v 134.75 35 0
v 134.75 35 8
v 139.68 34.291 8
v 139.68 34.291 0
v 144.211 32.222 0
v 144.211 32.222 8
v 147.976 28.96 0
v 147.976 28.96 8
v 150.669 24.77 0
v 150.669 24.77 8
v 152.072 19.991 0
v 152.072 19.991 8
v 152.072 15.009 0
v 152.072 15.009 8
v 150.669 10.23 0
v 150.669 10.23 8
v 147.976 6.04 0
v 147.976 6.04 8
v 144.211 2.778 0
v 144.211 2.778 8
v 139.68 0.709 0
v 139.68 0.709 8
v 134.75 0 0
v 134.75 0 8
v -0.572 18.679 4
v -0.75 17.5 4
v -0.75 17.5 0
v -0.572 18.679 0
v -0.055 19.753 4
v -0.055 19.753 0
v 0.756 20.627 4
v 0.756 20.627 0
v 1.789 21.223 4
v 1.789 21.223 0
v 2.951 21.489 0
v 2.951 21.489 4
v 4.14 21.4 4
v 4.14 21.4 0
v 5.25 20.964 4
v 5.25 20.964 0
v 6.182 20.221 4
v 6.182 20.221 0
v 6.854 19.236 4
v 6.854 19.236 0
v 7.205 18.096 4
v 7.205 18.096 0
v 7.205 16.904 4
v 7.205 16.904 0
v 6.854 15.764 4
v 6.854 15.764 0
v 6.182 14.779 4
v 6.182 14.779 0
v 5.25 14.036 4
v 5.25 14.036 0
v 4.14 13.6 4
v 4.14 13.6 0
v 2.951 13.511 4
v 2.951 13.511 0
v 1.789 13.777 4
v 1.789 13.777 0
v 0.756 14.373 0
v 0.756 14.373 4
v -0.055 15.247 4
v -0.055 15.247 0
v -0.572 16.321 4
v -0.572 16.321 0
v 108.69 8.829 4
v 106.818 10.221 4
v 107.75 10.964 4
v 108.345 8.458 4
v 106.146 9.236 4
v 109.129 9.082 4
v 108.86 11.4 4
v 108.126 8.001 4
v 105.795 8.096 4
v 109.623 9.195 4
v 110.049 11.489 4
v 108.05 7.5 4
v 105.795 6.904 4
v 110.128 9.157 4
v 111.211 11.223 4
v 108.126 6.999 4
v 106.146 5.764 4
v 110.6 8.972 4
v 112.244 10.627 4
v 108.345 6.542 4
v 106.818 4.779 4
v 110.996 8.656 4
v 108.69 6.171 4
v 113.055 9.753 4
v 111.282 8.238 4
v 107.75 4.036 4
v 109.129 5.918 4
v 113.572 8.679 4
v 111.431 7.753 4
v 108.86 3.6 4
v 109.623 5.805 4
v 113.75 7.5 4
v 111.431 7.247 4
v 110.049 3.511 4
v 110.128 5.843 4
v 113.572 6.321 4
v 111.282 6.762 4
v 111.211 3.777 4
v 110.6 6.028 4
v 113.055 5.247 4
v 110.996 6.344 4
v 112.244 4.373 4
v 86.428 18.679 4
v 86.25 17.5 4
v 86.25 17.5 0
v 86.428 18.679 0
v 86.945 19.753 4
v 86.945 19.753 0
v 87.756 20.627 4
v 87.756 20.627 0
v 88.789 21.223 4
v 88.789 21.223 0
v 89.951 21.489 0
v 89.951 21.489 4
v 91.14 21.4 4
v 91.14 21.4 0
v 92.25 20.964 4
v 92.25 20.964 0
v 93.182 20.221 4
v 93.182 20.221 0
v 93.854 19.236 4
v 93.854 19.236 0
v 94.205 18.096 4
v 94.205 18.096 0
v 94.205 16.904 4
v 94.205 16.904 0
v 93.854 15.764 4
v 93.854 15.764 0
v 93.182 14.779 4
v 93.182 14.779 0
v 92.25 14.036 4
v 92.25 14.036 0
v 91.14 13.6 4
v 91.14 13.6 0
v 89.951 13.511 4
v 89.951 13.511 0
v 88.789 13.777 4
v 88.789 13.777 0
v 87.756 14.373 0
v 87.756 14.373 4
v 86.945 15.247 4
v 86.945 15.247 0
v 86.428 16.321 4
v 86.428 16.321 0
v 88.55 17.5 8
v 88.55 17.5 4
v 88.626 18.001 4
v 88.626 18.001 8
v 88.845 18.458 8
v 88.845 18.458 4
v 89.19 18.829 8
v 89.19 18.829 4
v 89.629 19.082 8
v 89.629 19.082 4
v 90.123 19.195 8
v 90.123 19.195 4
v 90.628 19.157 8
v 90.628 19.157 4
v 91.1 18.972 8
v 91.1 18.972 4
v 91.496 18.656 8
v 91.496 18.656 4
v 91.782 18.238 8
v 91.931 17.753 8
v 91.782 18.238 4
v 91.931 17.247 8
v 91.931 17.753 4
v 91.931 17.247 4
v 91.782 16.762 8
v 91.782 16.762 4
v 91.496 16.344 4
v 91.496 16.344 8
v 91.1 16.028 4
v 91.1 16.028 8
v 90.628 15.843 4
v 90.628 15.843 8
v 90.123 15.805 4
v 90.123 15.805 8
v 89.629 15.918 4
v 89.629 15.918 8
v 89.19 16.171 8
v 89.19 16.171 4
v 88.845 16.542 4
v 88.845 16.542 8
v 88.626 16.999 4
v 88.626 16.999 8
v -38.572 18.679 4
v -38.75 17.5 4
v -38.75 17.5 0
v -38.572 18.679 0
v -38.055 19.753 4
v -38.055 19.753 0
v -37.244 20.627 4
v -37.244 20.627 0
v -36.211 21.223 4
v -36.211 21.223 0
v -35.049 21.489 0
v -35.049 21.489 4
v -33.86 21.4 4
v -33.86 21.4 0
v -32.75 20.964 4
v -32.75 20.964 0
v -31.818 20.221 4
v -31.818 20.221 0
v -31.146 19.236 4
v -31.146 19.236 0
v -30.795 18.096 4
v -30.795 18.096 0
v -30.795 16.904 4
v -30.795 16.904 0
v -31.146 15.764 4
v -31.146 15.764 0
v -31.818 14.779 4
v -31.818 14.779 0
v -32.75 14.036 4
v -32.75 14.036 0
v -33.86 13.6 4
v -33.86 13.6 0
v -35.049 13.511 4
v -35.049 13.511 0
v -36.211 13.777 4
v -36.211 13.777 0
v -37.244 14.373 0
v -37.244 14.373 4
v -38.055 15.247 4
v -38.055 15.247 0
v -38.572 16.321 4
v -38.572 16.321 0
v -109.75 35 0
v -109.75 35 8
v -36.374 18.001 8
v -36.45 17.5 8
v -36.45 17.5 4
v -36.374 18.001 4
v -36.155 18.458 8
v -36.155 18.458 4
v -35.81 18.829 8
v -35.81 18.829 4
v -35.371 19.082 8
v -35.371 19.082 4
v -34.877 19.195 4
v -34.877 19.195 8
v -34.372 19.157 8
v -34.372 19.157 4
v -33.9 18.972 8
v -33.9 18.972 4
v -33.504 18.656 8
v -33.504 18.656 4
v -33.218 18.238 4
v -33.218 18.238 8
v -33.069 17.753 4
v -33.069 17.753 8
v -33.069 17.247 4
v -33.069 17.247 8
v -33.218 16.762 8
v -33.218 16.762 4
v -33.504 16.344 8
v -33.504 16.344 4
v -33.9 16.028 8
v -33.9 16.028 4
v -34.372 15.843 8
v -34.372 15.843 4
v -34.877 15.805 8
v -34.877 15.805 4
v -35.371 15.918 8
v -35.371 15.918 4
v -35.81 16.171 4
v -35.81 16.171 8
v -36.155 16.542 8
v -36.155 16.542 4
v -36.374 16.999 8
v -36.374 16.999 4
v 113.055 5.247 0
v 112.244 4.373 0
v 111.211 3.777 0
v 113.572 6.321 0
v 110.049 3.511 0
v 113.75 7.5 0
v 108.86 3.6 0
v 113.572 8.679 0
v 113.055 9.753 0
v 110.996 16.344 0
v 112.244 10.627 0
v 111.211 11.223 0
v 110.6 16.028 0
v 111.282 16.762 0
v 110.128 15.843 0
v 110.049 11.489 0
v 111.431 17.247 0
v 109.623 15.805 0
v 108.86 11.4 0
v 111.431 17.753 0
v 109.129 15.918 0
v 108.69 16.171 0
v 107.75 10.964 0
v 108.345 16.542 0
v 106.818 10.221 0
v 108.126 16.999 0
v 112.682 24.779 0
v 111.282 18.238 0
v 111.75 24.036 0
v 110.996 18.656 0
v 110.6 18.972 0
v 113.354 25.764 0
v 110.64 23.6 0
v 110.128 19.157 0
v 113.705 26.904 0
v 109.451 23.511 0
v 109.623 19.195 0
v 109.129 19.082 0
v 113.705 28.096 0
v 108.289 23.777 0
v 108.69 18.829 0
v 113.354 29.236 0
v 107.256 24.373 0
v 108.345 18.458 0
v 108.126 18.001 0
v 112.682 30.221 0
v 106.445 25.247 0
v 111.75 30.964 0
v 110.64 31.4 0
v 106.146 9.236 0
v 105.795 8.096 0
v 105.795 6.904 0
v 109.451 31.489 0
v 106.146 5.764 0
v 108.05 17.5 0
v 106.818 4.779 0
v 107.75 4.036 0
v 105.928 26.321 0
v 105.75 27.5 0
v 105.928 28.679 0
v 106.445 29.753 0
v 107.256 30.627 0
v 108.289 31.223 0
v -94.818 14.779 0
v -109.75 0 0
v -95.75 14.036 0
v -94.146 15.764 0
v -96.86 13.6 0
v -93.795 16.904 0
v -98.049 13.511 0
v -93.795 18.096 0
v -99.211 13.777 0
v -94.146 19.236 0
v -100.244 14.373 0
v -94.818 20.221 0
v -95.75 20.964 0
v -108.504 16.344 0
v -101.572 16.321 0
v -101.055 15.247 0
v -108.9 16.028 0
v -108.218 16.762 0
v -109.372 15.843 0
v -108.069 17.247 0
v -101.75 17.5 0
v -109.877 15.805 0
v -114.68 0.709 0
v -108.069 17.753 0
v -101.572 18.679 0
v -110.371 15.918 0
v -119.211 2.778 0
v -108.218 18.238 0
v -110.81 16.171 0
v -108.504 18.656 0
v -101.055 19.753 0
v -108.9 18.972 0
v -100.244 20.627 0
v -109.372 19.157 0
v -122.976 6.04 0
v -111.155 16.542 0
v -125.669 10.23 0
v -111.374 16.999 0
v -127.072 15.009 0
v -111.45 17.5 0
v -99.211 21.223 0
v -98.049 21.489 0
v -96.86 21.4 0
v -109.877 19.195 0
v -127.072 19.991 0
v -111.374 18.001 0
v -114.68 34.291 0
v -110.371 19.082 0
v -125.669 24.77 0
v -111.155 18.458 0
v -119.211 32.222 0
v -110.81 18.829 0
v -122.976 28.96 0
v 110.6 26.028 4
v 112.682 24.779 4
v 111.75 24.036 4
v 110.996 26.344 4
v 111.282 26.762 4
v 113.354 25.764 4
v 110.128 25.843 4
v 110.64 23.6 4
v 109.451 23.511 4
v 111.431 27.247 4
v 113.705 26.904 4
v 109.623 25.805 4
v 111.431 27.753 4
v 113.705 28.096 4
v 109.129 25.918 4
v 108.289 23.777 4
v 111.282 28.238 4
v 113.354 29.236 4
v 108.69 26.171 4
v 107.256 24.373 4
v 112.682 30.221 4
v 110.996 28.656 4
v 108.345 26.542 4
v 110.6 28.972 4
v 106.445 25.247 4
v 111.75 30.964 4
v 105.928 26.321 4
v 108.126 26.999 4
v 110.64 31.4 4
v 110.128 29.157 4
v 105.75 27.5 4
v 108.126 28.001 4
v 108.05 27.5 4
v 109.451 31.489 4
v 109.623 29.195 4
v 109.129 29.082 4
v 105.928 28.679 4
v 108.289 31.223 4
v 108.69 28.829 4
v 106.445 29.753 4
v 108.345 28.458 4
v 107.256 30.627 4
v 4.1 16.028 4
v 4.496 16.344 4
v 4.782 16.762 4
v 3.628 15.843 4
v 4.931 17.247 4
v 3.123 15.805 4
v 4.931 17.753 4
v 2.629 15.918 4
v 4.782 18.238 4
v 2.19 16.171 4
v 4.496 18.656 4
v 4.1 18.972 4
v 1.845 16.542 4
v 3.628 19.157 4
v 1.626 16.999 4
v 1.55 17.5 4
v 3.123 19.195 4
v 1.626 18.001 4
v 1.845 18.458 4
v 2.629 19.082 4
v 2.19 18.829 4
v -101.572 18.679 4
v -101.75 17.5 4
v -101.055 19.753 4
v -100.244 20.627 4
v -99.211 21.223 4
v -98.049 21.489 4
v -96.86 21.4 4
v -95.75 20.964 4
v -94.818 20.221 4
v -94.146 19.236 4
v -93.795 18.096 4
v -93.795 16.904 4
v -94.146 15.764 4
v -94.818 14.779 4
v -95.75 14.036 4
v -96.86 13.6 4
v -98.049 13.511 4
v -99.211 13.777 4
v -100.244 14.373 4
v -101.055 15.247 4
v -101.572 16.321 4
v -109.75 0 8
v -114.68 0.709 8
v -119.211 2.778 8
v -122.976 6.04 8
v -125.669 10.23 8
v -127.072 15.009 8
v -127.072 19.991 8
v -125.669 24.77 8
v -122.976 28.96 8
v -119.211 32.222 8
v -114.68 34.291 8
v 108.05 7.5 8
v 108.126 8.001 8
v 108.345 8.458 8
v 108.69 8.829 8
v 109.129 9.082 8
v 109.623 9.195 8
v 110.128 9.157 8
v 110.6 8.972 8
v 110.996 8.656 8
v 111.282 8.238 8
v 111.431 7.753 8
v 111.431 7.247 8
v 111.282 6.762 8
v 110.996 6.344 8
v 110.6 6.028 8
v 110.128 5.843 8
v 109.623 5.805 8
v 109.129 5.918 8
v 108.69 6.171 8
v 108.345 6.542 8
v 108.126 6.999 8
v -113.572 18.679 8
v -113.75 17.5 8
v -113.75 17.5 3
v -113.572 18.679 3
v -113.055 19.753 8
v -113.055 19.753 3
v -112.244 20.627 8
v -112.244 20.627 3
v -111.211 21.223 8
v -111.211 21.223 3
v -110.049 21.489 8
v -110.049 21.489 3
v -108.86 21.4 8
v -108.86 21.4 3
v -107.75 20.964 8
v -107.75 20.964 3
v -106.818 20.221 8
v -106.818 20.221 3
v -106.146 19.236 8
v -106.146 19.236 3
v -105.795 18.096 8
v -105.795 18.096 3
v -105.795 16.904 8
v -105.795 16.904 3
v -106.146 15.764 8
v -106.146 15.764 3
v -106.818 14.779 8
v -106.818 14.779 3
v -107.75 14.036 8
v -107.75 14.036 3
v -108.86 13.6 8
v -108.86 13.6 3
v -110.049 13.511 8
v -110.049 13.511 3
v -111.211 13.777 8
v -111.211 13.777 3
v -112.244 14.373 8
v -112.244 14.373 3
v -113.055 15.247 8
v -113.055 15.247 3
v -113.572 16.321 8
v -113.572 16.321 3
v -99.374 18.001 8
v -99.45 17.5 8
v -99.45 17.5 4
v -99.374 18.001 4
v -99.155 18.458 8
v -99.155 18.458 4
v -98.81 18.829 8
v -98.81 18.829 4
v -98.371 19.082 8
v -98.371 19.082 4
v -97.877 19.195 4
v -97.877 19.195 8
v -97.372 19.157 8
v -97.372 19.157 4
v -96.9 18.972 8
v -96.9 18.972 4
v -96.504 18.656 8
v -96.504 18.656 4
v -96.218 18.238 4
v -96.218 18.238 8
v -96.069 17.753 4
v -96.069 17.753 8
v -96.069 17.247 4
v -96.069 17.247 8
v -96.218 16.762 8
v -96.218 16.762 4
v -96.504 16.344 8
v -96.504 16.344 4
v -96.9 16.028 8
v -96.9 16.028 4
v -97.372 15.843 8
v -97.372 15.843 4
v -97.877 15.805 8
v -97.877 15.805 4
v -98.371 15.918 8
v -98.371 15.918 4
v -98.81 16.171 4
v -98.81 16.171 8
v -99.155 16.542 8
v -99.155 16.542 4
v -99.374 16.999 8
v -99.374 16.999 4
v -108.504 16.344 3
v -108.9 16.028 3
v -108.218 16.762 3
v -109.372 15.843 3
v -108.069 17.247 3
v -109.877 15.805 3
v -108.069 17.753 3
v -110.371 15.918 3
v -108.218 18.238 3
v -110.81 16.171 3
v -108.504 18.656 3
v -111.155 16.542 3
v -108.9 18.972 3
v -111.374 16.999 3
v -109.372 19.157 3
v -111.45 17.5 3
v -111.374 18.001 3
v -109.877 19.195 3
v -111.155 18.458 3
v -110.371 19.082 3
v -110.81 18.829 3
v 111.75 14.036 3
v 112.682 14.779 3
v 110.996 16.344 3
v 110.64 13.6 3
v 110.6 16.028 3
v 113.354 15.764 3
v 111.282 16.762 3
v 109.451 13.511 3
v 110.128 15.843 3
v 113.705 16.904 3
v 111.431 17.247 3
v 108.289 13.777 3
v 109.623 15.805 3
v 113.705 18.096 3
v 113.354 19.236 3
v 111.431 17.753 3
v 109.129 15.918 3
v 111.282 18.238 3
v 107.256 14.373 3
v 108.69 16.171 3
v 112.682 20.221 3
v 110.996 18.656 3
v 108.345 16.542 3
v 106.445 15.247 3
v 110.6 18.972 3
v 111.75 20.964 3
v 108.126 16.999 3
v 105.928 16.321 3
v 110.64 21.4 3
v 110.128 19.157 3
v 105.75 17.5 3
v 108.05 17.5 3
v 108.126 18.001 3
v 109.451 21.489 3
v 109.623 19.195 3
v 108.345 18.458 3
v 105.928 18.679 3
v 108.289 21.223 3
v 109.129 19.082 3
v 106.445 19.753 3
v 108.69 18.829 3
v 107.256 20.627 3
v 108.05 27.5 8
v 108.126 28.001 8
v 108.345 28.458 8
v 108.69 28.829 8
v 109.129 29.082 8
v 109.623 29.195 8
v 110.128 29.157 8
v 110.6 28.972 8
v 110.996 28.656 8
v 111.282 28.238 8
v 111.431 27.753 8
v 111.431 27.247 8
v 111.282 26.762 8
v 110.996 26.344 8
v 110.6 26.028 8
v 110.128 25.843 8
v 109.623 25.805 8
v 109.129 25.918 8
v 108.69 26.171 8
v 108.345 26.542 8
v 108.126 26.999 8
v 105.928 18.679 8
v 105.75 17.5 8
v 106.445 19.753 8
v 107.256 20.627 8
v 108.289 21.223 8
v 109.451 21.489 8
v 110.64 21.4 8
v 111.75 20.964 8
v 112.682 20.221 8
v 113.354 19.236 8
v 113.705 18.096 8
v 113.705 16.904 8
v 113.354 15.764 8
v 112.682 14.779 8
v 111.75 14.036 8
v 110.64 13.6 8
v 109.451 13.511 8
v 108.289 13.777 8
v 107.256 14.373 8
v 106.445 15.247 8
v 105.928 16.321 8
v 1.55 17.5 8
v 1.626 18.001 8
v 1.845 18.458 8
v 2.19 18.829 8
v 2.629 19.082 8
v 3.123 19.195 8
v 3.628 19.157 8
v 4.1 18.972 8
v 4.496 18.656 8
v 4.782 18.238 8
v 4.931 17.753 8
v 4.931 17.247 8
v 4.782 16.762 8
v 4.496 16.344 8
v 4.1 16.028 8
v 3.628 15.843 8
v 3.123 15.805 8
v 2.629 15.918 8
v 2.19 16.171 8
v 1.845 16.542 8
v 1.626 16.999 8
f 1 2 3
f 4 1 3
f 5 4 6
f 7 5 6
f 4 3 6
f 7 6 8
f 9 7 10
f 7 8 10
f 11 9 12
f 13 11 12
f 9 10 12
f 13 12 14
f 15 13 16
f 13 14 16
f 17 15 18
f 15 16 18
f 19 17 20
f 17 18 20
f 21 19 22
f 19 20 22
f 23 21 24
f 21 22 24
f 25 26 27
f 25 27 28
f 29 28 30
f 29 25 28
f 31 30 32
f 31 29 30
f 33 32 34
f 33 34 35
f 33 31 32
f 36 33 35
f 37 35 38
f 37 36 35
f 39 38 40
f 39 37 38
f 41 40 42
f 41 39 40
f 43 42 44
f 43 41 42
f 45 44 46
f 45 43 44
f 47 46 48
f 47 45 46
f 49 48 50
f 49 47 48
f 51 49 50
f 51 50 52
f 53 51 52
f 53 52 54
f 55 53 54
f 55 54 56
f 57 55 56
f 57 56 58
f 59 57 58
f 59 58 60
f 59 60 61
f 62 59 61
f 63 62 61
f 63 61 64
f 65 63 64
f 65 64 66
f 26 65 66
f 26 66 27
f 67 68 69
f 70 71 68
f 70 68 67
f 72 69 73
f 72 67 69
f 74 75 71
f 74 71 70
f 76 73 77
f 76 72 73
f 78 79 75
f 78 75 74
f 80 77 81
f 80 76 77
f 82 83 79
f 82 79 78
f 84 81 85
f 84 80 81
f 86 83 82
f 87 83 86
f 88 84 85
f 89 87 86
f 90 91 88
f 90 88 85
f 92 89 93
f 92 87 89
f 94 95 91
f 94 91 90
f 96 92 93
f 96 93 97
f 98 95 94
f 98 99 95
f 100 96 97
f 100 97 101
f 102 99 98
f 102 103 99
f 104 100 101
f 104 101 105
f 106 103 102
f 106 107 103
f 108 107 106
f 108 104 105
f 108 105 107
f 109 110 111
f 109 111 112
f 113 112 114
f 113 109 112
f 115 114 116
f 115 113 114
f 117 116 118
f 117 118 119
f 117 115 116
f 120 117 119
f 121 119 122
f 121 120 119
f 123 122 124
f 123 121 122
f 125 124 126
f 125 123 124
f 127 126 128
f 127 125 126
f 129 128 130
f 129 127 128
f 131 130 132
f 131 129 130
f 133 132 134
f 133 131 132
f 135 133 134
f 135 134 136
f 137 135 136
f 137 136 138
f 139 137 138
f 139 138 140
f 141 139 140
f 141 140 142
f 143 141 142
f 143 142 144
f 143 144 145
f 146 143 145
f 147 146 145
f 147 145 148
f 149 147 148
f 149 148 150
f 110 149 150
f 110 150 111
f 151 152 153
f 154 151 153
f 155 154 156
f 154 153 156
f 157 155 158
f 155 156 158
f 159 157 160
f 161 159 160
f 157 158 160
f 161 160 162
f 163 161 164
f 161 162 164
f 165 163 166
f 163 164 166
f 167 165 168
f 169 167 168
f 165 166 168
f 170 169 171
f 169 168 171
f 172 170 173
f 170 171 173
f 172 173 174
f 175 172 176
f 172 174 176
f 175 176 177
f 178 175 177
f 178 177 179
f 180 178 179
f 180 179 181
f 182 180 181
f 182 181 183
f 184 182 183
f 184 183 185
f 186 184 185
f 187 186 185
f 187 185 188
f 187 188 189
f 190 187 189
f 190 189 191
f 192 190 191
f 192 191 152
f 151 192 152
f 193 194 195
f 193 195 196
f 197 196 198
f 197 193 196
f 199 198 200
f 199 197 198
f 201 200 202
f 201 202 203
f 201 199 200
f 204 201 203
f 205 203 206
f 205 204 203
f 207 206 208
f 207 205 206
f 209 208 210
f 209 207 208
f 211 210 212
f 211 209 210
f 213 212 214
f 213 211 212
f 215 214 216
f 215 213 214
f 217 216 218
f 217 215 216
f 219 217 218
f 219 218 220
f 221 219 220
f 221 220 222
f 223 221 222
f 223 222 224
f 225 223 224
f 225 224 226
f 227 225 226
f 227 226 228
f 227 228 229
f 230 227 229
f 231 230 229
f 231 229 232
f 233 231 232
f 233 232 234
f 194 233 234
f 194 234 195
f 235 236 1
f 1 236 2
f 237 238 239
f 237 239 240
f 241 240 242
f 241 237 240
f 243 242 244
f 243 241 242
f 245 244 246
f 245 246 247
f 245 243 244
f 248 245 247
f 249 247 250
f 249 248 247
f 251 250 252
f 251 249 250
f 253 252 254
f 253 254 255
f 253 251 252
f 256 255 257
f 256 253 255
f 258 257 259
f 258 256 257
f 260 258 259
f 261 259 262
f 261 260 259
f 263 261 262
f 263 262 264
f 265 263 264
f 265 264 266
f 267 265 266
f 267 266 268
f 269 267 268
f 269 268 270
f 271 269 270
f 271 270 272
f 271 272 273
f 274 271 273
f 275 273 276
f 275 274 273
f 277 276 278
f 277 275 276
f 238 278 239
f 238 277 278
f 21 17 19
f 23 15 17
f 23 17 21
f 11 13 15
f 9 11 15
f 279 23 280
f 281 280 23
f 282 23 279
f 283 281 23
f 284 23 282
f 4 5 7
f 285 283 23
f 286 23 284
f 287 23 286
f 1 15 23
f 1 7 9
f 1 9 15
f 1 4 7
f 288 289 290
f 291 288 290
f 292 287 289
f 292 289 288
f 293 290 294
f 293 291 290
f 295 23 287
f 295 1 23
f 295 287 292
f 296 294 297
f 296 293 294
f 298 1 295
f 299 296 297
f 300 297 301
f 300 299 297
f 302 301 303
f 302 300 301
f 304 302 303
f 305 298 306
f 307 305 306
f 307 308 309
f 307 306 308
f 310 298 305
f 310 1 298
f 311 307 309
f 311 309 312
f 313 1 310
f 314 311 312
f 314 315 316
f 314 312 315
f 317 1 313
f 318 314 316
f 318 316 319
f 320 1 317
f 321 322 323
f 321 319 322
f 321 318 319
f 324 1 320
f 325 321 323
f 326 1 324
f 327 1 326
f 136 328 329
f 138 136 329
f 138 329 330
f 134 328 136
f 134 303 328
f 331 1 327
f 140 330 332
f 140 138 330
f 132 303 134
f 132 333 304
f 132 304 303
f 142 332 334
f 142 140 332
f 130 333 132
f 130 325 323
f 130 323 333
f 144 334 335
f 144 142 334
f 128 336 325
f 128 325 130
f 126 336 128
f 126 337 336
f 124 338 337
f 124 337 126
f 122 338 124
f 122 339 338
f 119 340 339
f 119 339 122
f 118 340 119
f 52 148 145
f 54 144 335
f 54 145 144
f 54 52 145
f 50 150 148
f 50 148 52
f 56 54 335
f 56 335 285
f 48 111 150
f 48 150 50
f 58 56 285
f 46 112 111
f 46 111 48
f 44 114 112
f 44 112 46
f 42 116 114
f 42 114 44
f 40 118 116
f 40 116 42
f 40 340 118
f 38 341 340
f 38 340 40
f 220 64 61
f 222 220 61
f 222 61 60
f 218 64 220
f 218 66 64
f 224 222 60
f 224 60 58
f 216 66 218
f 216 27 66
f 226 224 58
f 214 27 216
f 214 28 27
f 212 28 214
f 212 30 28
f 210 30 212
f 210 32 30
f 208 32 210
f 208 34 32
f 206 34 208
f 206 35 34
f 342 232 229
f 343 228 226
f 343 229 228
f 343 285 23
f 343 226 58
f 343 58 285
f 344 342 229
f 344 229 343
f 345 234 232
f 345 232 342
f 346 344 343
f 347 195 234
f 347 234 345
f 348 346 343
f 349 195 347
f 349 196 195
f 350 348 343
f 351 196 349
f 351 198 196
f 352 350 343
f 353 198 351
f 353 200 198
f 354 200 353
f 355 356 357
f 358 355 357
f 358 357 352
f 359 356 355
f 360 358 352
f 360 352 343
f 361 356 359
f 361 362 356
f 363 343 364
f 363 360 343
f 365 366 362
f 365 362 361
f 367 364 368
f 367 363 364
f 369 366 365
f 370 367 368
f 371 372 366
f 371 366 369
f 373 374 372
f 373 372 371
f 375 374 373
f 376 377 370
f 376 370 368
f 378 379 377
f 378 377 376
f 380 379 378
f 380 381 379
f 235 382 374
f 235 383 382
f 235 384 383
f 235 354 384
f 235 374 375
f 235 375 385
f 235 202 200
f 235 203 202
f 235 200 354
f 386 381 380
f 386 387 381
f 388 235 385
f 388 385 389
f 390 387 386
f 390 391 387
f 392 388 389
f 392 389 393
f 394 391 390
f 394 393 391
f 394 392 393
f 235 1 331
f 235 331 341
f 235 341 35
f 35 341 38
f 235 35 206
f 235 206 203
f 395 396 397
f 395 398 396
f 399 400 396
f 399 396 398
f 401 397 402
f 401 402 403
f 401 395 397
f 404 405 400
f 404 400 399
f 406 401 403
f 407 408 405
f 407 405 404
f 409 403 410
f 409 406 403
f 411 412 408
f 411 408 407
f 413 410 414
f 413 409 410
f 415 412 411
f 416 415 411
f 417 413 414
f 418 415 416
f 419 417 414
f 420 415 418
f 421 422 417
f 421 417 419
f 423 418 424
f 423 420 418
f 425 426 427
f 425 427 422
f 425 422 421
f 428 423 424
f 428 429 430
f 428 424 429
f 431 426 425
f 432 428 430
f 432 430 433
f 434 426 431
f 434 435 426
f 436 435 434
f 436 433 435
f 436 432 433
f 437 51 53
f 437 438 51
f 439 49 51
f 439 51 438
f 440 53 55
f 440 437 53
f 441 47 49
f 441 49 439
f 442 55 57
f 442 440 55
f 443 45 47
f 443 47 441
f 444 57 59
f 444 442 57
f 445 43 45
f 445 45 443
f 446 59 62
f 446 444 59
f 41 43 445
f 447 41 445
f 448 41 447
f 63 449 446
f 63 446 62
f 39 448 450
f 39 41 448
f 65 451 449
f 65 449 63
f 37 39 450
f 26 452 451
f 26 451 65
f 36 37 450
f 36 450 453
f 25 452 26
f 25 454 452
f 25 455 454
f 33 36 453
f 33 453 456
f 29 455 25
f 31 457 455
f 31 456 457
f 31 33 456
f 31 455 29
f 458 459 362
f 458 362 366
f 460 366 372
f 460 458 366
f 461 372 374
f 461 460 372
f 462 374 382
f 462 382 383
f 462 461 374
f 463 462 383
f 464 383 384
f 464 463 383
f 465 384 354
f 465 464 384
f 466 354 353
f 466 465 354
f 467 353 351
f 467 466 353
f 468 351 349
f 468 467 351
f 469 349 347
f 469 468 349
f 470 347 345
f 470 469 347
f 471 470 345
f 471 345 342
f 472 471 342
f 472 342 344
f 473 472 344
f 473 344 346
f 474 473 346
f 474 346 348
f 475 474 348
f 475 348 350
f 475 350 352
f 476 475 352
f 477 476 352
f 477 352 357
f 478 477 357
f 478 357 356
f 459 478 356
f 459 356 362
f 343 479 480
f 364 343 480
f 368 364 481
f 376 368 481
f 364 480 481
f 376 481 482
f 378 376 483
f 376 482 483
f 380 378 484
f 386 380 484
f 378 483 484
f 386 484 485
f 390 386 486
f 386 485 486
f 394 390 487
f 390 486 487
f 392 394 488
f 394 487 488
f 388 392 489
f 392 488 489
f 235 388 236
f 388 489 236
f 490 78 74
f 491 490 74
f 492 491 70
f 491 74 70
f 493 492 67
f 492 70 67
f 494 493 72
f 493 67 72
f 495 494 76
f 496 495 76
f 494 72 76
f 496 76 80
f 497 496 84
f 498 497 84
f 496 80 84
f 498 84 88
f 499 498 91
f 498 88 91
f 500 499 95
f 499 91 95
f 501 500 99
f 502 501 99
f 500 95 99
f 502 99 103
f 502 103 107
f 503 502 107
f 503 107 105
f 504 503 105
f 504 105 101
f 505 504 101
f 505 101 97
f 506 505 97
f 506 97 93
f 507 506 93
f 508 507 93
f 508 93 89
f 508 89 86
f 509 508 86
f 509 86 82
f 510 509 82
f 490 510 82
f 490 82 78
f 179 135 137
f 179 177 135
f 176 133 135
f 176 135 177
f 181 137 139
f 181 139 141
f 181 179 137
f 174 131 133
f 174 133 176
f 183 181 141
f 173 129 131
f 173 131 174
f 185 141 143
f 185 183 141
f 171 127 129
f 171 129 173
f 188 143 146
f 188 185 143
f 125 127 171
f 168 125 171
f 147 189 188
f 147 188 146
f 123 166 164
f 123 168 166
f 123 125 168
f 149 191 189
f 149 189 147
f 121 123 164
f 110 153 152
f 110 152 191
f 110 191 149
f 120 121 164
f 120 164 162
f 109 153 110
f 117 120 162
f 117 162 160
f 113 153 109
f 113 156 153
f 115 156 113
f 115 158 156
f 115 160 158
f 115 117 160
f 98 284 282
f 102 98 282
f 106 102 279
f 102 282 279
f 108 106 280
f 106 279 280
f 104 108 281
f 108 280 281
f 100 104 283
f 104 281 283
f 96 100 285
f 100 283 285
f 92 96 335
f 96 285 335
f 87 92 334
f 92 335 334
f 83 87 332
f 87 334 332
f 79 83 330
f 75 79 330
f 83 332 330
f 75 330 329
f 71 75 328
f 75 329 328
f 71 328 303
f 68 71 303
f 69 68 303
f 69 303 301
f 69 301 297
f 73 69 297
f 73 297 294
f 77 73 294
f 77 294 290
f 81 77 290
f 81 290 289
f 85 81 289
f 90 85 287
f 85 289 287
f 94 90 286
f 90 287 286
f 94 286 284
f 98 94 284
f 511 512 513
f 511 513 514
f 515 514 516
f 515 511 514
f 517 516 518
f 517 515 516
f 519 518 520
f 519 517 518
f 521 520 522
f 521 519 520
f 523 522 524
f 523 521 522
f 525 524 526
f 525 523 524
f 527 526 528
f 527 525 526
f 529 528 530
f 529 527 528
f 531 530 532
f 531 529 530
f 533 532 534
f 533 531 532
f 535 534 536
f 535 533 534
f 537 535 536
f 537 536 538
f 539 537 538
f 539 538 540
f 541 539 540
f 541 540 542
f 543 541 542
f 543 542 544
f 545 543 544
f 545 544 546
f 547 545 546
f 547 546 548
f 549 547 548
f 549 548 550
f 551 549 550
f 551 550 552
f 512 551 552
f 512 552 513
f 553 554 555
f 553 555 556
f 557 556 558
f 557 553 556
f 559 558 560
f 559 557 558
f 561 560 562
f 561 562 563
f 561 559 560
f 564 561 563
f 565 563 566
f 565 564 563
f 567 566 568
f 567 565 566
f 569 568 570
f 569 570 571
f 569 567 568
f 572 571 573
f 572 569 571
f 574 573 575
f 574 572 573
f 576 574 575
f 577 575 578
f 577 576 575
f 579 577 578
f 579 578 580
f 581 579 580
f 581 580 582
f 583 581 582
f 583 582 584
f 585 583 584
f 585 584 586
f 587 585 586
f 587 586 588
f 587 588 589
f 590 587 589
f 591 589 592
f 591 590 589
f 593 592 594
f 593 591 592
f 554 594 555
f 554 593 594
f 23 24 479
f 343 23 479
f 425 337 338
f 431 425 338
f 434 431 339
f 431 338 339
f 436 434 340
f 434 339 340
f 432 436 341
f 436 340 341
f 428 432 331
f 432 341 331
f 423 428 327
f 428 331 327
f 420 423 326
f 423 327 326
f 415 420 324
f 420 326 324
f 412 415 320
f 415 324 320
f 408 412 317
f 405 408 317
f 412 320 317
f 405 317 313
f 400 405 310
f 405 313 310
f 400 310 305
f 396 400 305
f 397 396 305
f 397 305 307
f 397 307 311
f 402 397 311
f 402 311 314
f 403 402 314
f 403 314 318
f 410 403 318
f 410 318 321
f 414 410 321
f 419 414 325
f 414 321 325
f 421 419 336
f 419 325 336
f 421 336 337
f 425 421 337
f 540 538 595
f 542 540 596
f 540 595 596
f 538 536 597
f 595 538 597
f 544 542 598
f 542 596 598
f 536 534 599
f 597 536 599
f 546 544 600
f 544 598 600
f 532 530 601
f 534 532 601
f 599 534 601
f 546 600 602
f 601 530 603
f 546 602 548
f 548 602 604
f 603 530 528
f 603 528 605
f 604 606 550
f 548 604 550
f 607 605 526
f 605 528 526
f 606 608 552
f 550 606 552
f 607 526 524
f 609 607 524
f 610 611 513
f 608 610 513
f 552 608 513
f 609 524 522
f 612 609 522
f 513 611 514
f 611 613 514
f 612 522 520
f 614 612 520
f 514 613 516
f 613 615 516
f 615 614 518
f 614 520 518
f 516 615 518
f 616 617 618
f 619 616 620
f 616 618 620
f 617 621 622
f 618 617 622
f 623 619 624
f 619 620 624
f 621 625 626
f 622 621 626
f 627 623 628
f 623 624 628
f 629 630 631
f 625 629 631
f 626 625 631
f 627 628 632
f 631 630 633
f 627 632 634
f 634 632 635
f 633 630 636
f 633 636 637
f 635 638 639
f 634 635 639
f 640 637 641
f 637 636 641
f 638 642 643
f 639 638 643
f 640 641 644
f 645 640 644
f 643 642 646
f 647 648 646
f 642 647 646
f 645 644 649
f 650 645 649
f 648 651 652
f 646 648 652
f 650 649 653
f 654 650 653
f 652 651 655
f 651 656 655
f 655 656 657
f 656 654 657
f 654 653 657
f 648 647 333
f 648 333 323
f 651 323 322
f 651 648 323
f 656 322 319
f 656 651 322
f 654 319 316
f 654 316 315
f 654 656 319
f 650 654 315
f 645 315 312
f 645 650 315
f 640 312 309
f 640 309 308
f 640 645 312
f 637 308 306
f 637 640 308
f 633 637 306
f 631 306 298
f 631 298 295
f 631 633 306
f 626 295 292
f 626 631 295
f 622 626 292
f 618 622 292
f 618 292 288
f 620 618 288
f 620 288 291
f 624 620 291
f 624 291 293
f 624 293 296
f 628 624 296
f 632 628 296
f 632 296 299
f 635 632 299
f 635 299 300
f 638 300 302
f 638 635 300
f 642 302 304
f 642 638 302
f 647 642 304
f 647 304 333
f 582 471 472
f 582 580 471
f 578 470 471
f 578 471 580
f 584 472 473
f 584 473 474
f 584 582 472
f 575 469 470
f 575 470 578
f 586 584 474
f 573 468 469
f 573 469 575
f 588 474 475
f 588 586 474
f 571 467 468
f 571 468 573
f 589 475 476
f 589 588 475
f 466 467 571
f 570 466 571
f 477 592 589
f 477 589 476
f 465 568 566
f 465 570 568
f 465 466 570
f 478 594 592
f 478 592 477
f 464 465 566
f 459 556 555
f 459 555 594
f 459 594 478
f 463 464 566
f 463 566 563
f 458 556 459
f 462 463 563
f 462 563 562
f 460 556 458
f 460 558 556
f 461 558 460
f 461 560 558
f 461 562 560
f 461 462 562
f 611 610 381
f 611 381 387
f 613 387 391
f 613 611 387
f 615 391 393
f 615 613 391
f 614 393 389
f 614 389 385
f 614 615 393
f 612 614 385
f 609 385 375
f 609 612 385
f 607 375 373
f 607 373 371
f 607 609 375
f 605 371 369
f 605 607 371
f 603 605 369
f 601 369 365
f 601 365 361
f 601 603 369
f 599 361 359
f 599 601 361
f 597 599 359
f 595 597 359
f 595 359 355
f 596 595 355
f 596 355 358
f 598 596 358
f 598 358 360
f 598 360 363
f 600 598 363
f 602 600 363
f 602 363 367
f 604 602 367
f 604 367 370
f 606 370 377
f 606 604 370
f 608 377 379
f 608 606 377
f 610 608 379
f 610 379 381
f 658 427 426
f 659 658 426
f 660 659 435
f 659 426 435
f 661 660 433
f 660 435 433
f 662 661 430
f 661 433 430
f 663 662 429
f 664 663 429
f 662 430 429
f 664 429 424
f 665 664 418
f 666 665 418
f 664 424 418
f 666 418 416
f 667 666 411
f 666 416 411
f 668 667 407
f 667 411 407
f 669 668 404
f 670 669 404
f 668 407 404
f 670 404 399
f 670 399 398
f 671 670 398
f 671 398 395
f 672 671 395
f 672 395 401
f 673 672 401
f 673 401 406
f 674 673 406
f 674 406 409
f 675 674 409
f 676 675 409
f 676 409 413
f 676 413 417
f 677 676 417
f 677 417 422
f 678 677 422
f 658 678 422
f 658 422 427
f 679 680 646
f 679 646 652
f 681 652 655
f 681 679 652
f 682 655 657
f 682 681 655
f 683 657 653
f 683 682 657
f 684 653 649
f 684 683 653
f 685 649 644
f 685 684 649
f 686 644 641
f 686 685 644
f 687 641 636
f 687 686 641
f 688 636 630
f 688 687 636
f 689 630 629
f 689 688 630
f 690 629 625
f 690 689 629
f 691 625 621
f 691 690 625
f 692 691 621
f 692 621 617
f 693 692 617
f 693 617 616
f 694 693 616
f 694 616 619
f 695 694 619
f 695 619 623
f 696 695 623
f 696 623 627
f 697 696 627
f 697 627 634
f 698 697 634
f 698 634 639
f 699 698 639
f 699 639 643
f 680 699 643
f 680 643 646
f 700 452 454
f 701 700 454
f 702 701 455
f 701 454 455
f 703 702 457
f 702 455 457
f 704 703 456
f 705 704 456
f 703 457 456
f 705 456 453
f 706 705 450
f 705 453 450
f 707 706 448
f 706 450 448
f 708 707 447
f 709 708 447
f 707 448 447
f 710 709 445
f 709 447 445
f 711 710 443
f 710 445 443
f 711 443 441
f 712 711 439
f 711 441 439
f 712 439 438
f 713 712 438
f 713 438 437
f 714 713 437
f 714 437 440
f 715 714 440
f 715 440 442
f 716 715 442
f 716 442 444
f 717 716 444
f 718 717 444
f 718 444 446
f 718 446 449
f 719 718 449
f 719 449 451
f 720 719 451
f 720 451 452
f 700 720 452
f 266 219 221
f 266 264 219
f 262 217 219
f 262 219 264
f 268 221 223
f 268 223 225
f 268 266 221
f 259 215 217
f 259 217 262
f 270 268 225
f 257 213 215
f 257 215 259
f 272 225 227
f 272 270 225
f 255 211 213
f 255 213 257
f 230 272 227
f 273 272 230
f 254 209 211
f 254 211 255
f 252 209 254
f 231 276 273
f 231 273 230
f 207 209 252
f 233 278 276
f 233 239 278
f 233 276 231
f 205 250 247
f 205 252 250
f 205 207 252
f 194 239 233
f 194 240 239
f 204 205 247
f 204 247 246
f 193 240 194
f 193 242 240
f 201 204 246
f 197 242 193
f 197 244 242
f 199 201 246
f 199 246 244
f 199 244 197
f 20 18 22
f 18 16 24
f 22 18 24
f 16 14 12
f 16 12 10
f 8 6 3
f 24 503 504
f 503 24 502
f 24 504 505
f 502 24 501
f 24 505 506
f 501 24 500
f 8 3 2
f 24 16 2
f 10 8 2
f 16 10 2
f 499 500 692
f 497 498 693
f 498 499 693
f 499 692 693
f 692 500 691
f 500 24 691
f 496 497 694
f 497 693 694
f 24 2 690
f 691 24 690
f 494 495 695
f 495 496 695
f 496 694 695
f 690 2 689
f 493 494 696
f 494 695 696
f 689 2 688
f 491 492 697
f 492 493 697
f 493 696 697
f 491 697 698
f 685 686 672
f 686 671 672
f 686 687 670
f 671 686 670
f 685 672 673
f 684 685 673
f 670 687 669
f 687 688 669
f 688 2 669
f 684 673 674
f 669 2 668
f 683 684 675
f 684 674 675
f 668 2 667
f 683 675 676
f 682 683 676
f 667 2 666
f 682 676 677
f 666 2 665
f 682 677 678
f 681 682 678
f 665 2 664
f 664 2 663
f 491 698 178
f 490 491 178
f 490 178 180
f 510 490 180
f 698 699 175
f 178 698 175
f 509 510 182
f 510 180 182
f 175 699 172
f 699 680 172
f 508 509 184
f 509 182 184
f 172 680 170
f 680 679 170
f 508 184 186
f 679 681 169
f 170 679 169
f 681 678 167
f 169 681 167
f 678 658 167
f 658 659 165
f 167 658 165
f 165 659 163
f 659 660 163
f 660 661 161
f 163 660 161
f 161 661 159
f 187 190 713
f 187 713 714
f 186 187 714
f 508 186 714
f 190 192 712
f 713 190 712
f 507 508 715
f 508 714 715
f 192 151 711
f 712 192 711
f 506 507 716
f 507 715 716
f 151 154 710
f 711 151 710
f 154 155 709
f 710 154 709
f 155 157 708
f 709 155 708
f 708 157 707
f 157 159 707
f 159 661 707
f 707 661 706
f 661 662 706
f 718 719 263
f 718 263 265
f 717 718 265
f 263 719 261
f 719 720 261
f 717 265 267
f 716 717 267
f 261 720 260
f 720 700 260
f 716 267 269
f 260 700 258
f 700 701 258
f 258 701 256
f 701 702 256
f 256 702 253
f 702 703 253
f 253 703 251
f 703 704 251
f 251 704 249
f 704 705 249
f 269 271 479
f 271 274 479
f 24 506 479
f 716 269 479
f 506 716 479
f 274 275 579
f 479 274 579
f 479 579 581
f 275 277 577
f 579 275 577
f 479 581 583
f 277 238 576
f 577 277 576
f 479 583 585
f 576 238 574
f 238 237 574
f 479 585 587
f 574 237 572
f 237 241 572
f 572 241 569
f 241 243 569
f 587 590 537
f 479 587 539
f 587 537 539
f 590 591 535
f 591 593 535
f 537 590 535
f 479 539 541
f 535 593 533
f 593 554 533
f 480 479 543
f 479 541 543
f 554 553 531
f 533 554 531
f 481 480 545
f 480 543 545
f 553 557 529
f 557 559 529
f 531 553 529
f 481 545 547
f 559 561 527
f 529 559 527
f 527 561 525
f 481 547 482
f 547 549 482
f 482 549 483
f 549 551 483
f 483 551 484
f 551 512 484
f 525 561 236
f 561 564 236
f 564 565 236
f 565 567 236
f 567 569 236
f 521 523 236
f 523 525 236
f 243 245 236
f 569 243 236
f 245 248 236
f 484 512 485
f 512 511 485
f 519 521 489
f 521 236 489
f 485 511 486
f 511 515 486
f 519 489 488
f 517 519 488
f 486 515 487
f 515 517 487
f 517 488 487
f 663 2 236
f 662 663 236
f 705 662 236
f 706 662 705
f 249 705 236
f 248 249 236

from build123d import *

# Parameters (mm, degrees)
CUT_EXTRUDE1_START         = -8.000000119
CUT_EXTRUDE1_OUTLINE_R     = 3.999999708
CUT_EXTRUDE1_OUTLINE_R_2   = 4
CUT_EXTRUDE1_OUTLINE_R_3   = 4.000000498
CUT_EXTRUDE1_OUTLINE_R_4   = 1.7
CUT_EXTRUDE1_DEPTH         = 8.000000119
CUT_EXTRUDE1_2_OUTLINE_R   = 4
CUT_EXTRUDE1_2_OUTLINE_R_2 = 1.7
CUT_EXTRUDE1_2_DEPTH       = 4.000000119
CUT_EXTRUDE1_START_2       = -3.000000119
CUT_EXTRUDE1_3_OUTLINE_R   = 4.000000498
CUT_EXTRUDE1_3_OUTLINE_R_2 = 1.699999454
CUT_EXTRUDE1_3_OUTLINE_R_3 = 3.999999708
CUT_EXTRUDE1_3_OUTLINE_R_4 = 1.700000883
CUT_EXTRUDE1_3_DEPTH       = 3.000000119
SKETCH2_R                  = 1.7
CUT_EXTRUDE2_DEPTH         = 133.217863668
BOSS_EXTRUDE1_START        = -8.000000119
BOSS_EXTRUDE1_DEPTH        = 8.000000119
SKETCH4_R                  = 4
SKETCH4_R_2                = 1.7
CUT_EXTRUDE3_DEPTH         = 4
SKETCH5_R                  = 1.7
CUT_EXTRUDE4_DEPTH         = 157.425904707


with BuildPart() as part:
    # Cut-Extrude1: read off the stored shape, not the designer's step
    # Cut-Extrude1 outline → Cut-Extrude1 (new body)
    # profile 1 of 3: a face of its own
    with BuildSketch(Plane(origin=(0, 0, 0), x_dir=(-1, 0, 0), z_dir=(0, 0, -1)).offset(CUT_EXTRUDE1_START)):
        with BuildLine():
            ThreePointArc((109.750003815, 0), (127.250003815, 17.5), (109.750003815, 35))
            Line((109.750003815, 35), (-109.750003815, 35))
            ThreePointArc((-109.750003815, 35), (-127.250003815, 17.5), (-109.750003815, 0))
            Line((-109.750003815, 0), (109.750003815, 0))
        make_face()
        with Locations((-109.750001685, 17.500000345)):
            Circle(CUT_EXTRUDE1_OUTLINE_R, mode=Mode.SUBTRACT)
        with Locations((-90.249998482, 17.5)):
            Circle(CUT_EXTRUDE1_OUTLINE_R_2, mode=Mode.SUBTRACT)
        with Locations((-3.249998482, 17.5)):
            Circle(CUT_EXTRUDE1_OUTLINE_R_2, mode=Mode.SUBTRACT)
        with Locations((34.750001518, 17.5)):
            Circle(CUT_EXTRUDE1_OUTLINE_R_2, mode=Mode.SUBTRACT)
        with Locations((97.750001518, 17.5)):
            Circle(CUT_EXTRUDE1_OUTLINE_R_2, mode=Mode.SUBTRACT)
        with Locations((109.750001518, 17.500000345)):
            Circle(CUT_EXTRUDE1_OUTLINE_R_3, mode=Mode.SUBTRACT)
    # profile 2 of 3: a face of its own
    with BuildSketch(Plane(origin=(0, 0, 0), x_dir=(-1, 0, 0), z_dir=(0, 0, -1)).offset(CUT_EXTRUDE1_START)):
        with Locations((-3.249998482, 17.5)):
            Circle(CUT_EXTRUDE1_OUTLINE_R_4)
    # profile 3 of 3: a face of its own
    with BuildSketch(Plane(origin=(0, 0, 0), x_dir=(-1, 0, 0), z_dir=(0, 0, -1)).offset(CUT_EXTRUDE1_START)):
        with Locations((-90.249998482, 17.5)):
            Circle(CUT_EXTRUDE1_OUTLINE_R_4)
    extrude(amount=CUT_EXTRUDE1_DEPTH)

    # Cut-Extrude1 2 outline → Cut-Extrude1 2 (add)
    # profile 1 of 4: a face of its own
    with BuildSketch(Plane(origin=(0, 0, 0), x_dir=(-1, 0, 0), z_dir=(0, 0, -1)).offset(CUT_EXTRUDE1_START)):
        with Locations((34.750001518, 17.5)):
            Circle(CUT_EXTRUDE1_2_OUTLINE_R)
        with Locations((34.750001518, 17.5)):
            Circle(CUT_EXTRUDE1_2_OUTLINE_R_2, mode=Mode.SUBTRACT)
    # profile 2 of 4: a face of its own
    with BuildSketch(Plane(origin=(0, 0, 0), x_dir=(-1, 0, 0), z_dir=(0, 0, -1)).offset(CUT_EXTRUDE1_START)):
        with Locations((97.750001518, 17.5)):
            Circle(CUT_EXTRUDE1_2_OUTLINE_R)
        with Locations((97.750001518, 17.5)):
            Circle(CUT_EXTRUDE1_2_OUTLINE_R_2, mode=Mode.SUBTRACT)
    # profile 3 of 4: a face of its own
    with BuildSketch(Plane(origin=(0, 0, 0), x_dir=(-1, 0, 0), z_dir=(0, 0, -1)).offset(CUT_EXTRUDE1_START)):
        with Locations((-3.249998482, 17.5)):
            Circle(CUT_EXTRUDE1_2_OUTLINE_R)
        with Locations((-3.249998482, 17.5)):
            Circle(CUT_EXTRUDE1_2_OUTLINE_R_2, mode=Mode.SUBTRACT)
    # profile 4 of 4: a face of its own
    with BuildSketch(Plane(origin=(0, 0, 0), x_dir=(-1, 0, 0), z_dir=(0, 0, -1)).offset(CUT_EXTRUDE1_START)):
        with Locations((-90.249998482, 17.5)):
            Circle(CUT_EXTRUDE1_2_OUTLINE_R)
        with Locations((-90.249998482, 17.5)):
            Circle(CUT_EXTRUDE1_2_OUTLINE_R_2, mode=Mode.SUBTRACT)
    extrude(amount=CUT_EXTRUDE1_2_DEPTH)

    # Cut-Extrude1 3 outline → Cut-Extrude1 3 (add)
    # profile 1 of 2: a face of its own
    with BuildSketch(Plane(origin=(0, 0, 0), x_dir=(-1, 0, 0), z_dir=(0, 0, -1)).offset(CUT_EXTRUDE1_START_2)):
        with Locations((109.750001518, 17.500000345)):
            Circle(CUT_EXTRUDE1_3_OUTLINE_R)
        with Locations((109.750002847, 17.500000345)):
            Circle(CUT_EXTRUDE1_3_OUTLINE_R_2, mode=Mode.SUBTRACT)
    # profile 2 of 2: a face of its own
    with BuildSketch(Plane(origin=(0, 0, 0), x_dir=(-1, 0, 0), z_dir=(0, 0, -1)).offset(CUT_EXTRUDE1_START_2)):
        with Locations((-109.750001685, 17.500000345)):
            Circle(CUT_EXTRUDE1_3_OUTLINE_R_3)
        with Locations((-109.750001213, 17.500000345)):
            Circle(CUT_EXTRUDE1_3_OUTLINE_R_4, mode=Mode.SUBTRACT)
    extrude(amount=CUT_EXTRUDE1_3_DEPTH)

    # Sketch2 → Cut-Extrude2 (cut, through all)
    with BuildSketch(Plane(origin=(0, 0, 0), x_dir=(-1, 0, 0), z_dir=(0, 0, -1))):
        with Locations((-90.249998482, 17.5)):
            Circle(SKETCH2_R)
        with Locations((-3.249998482, 17.5)):
            Circle(SKETCH2_R)
    extrude(amount=-CUT_EXTRUDE2_DEPTH, mode=Mode.SUBTRACT)

    # Sketch3 → Boss-Extrude1 (add)
    with BuildSketch(Plane(origin=(0, 0, 0), x_dir=(-1, 0, 0), z_dir=(0, 0, -1)).offset(BOSS_EXTRUDE1_START)):
        with BuildLine():
            Line((-109.750003815, 35), (-134.750003815, 35))
            ThreePointArc((-134.750003815, 35), (-152.250003815, 17.5), (-134.750003815, 0))
            Line((-134.750003815, 0), (-109.750003815, 0))
            ThreePointArc((-109.750003815, 0), (-127.250003815, 17.5), (-109.750003815, 35))
        make_face()
    extrude(amount=BOSS_EXTRUDE1_DEPTH)

    # Sketch4 → Cut-Extrude3 (cut)
    # profile 1 of 2: a face of its own
    with BuildSketch(Plane(origin=(0, 0, 0), x_dir=(-1, 0, 0), z_dir=(0, 0, -1))):
        with Locations((-109.750001213, 27.500000345)):
            Circle(SKETCH4_R)
        with Locations((-109.750001213, 27.500000345)):
            Circle(SKETCH4_R_2, mode=Mode.SUBTRACT)
    # profile 2 of 2: a face of its own
    with BuildSketch(Plane(origin=(0, 0, 0), x_dir=(-1, 0, 0), z_dir=(0, 0, -1))):
        with Locations(Location((-109.750001213, 7.500000345, 0), (0, 0, 180))):
            Circle(SKETCH4_R)
        with Locations(Location((-109.750001213, 7.500000345, 0), (0, 0, 180))):
            Circle(SKETCH4_R_2, mode=Mode.SUBTRACT)
    extrude(amount=-CUT_EXTRUDE3_DEPTH, mode=Mode.SUBTRACT)

    # Sketch5 → Cut-Extrude4 (cut, through all)
    with BuildSketch(Plane(origin=(0, 0, 0), x_dir=(-1, 0, 0), z_dir=(0, 0, -1))):
        with Locations((-109.750001213, 27.500000345)):
            Circle(SKETCH5_R)
        with Locations((-109.750001213, 7.500000345)):
            Circle(SKETCH5_R)
    extrude(amount=-CUT_EXTRUDE4_DEPTH, mode=Mode.SUBTRACT)


solid = part.part
